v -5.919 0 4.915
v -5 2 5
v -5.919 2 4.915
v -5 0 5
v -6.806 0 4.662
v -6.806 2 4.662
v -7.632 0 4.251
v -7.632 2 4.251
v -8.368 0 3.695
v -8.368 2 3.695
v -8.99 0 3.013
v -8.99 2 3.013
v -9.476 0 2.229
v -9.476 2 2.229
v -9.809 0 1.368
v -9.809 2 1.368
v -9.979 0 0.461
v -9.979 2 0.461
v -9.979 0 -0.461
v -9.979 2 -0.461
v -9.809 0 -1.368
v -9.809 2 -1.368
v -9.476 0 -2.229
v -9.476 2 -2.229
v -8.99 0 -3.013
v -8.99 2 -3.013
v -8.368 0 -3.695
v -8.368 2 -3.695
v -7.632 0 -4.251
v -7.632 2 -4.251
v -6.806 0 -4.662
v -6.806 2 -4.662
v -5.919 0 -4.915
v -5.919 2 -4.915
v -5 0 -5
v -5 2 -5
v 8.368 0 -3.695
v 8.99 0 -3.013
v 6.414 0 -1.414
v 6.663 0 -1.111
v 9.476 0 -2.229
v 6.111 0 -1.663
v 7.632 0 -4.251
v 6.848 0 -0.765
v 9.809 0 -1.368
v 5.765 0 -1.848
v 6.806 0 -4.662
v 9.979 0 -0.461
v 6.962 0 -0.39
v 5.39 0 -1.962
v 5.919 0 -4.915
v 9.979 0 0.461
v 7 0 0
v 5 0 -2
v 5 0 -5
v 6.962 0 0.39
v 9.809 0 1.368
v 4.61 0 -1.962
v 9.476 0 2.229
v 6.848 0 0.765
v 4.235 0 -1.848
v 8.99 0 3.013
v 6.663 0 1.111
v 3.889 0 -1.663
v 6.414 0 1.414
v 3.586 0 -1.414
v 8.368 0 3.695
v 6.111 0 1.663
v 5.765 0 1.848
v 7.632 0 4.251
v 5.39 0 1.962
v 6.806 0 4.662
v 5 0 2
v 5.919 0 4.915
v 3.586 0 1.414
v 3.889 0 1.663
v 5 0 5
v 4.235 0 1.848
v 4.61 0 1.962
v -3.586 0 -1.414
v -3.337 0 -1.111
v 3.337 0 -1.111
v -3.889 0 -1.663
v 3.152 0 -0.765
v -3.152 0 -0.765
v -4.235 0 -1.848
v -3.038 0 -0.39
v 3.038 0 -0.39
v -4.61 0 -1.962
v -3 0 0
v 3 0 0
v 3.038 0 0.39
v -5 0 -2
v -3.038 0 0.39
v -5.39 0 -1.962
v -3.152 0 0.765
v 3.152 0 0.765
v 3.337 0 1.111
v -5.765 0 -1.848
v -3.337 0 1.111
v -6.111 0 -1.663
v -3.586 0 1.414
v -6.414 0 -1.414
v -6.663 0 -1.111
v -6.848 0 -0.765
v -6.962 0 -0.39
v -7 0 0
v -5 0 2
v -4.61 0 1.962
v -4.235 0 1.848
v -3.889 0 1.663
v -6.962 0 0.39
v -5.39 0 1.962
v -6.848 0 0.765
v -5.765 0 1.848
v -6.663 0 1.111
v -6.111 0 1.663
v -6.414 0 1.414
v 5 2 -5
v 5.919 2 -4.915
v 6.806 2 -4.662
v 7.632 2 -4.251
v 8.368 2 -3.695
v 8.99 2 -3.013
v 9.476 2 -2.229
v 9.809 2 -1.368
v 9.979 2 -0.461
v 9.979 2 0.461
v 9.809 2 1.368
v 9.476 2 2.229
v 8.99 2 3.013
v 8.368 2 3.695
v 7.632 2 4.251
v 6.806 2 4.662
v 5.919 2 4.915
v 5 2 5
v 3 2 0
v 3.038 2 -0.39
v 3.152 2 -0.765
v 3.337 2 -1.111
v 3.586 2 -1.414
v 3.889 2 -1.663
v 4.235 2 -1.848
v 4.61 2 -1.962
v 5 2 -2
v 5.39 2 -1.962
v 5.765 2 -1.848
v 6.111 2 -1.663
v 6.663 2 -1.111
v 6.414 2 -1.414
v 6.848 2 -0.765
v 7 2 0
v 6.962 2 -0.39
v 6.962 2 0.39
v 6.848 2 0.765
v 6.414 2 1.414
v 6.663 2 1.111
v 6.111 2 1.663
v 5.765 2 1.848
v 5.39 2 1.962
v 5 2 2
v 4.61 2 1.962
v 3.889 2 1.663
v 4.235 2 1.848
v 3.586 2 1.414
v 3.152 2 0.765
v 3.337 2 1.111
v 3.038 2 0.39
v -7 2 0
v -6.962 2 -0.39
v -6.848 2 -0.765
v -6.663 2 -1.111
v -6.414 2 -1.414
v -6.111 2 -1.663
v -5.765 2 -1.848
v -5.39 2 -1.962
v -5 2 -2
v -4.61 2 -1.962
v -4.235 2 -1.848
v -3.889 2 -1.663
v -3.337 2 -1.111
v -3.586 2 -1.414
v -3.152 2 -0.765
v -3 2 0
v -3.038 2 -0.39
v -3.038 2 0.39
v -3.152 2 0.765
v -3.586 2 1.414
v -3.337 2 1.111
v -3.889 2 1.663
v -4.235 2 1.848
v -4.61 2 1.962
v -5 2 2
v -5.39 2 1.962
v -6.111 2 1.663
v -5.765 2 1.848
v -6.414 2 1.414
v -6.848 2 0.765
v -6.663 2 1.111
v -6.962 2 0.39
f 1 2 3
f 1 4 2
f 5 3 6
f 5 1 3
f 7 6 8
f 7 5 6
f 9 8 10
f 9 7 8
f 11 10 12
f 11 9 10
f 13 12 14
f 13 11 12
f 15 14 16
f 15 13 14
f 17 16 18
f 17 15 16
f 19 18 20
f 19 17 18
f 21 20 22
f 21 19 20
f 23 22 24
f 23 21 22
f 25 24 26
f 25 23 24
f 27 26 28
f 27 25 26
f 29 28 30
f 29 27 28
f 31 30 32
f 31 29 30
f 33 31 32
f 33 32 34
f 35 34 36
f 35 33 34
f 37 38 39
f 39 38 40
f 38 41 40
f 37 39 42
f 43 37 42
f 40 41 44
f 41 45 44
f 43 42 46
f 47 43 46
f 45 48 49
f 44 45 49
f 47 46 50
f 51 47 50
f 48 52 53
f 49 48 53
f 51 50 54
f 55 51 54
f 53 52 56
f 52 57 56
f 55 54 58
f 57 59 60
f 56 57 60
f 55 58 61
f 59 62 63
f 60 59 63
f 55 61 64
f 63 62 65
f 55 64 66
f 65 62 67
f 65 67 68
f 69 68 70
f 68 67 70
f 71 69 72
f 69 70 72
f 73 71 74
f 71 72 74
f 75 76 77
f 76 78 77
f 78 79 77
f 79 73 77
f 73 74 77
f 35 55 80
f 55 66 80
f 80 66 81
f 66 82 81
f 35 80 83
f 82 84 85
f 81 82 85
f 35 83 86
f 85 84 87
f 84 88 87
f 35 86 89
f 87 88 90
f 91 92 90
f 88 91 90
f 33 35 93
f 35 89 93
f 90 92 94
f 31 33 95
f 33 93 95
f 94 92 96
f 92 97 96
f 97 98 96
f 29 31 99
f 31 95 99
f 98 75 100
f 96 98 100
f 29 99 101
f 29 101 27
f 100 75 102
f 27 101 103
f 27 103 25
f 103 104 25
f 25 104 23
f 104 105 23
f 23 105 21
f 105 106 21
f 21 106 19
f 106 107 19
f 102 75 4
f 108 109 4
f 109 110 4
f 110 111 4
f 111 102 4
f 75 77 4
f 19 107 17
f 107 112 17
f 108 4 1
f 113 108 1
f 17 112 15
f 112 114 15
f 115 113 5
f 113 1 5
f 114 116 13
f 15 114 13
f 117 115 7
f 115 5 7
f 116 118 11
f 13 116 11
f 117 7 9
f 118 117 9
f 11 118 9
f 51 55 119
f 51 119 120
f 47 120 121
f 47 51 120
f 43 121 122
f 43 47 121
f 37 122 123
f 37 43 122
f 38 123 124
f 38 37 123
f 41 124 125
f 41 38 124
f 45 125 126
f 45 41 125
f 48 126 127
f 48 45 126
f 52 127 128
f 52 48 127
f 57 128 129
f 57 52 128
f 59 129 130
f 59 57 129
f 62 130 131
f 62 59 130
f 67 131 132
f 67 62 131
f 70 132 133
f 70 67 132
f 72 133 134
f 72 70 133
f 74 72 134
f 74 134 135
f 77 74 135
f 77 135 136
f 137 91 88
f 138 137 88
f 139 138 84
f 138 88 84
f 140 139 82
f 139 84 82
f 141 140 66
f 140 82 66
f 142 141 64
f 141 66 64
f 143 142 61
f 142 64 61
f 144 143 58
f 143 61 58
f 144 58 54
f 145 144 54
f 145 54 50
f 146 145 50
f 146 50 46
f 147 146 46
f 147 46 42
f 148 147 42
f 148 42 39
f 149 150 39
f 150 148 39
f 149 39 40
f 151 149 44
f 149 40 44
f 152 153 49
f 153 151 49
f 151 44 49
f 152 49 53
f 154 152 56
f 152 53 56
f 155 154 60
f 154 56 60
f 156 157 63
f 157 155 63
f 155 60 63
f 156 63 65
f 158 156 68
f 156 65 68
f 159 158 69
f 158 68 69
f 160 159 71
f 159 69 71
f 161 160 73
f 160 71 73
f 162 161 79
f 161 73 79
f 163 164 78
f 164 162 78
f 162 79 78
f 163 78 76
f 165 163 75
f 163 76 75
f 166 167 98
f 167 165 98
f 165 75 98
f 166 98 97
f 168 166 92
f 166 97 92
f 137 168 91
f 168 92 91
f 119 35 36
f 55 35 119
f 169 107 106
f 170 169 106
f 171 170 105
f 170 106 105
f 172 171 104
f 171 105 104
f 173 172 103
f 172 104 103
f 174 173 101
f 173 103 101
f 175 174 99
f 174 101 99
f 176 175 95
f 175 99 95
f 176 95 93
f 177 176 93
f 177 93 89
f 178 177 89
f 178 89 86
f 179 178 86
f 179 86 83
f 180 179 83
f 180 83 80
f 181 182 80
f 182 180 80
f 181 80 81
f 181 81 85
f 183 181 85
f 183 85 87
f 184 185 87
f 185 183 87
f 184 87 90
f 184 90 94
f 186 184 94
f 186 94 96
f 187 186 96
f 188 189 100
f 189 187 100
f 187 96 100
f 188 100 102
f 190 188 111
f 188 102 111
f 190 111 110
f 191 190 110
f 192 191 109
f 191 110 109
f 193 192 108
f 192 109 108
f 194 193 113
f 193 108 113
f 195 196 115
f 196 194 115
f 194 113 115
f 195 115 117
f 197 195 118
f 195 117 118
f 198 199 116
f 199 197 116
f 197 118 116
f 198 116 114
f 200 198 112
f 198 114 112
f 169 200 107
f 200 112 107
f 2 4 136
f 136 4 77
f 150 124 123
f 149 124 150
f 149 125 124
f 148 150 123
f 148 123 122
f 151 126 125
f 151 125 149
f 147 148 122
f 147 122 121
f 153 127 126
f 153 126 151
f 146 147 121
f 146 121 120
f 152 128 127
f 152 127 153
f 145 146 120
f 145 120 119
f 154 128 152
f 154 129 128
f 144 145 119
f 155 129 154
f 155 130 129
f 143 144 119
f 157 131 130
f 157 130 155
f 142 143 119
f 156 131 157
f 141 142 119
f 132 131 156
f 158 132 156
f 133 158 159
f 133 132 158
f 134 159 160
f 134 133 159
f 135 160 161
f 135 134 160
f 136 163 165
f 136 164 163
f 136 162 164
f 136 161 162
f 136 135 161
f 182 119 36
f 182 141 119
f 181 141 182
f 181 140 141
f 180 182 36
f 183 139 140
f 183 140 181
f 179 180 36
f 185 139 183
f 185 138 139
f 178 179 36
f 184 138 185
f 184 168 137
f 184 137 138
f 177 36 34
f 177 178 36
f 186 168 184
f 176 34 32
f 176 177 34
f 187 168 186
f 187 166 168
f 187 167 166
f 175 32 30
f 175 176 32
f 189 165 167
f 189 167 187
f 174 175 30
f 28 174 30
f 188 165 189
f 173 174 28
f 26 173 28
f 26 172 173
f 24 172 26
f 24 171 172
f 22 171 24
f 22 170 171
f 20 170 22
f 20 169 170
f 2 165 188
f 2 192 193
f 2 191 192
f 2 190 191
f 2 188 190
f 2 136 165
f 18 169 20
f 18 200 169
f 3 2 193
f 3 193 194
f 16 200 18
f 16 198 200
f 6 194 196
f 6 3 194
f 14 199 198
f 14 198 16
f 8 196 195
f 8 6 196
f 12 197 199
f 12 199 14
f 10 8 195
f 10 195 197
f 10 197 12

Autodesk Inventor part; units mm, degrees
ref_plane "YZ Plane" through (0, 0, 0) normal (1, 0, 0) x (0, 1, 0)
ref_plane "XZ Plane" through (0, 0, 0) normal (0, 1, 0) x (-1, 0, 0)
ref_plane "XY Plane" through (0, 0, 0) normal (0, 0, 1) x (1, 0, 0)
sketch "Sketch1" plane through (0, 0, 0) normal (0, 1, 0) x (-1, 0, 0)
  arc A0 (5, -5) -> (5, 5) centre (5, 0) ccw
  arc A1 (-5, 5) -> (-5, -5) centre (-5, 0) ccw
  line L0 (0, -7) -> (0, 7) projected
  line L1 (5, -5) -> (-5, -5)
  line L2 (5, 5) -> (-5, 5)
  circle A2 centre (5, 0) radius 2
  circle A3 centre (-5, 0) radius 2
  point P0 (0, 0)
  point P1 (-10, 0)
  point P2 (10, 0)
  dimension "d0" = 10
  dimension "d1" = 4
  dimension "d3" = 20
extrude "Extrusion1" add sketch "Sketch1" along normal blind 2
properties part number "T Slot Nut"
